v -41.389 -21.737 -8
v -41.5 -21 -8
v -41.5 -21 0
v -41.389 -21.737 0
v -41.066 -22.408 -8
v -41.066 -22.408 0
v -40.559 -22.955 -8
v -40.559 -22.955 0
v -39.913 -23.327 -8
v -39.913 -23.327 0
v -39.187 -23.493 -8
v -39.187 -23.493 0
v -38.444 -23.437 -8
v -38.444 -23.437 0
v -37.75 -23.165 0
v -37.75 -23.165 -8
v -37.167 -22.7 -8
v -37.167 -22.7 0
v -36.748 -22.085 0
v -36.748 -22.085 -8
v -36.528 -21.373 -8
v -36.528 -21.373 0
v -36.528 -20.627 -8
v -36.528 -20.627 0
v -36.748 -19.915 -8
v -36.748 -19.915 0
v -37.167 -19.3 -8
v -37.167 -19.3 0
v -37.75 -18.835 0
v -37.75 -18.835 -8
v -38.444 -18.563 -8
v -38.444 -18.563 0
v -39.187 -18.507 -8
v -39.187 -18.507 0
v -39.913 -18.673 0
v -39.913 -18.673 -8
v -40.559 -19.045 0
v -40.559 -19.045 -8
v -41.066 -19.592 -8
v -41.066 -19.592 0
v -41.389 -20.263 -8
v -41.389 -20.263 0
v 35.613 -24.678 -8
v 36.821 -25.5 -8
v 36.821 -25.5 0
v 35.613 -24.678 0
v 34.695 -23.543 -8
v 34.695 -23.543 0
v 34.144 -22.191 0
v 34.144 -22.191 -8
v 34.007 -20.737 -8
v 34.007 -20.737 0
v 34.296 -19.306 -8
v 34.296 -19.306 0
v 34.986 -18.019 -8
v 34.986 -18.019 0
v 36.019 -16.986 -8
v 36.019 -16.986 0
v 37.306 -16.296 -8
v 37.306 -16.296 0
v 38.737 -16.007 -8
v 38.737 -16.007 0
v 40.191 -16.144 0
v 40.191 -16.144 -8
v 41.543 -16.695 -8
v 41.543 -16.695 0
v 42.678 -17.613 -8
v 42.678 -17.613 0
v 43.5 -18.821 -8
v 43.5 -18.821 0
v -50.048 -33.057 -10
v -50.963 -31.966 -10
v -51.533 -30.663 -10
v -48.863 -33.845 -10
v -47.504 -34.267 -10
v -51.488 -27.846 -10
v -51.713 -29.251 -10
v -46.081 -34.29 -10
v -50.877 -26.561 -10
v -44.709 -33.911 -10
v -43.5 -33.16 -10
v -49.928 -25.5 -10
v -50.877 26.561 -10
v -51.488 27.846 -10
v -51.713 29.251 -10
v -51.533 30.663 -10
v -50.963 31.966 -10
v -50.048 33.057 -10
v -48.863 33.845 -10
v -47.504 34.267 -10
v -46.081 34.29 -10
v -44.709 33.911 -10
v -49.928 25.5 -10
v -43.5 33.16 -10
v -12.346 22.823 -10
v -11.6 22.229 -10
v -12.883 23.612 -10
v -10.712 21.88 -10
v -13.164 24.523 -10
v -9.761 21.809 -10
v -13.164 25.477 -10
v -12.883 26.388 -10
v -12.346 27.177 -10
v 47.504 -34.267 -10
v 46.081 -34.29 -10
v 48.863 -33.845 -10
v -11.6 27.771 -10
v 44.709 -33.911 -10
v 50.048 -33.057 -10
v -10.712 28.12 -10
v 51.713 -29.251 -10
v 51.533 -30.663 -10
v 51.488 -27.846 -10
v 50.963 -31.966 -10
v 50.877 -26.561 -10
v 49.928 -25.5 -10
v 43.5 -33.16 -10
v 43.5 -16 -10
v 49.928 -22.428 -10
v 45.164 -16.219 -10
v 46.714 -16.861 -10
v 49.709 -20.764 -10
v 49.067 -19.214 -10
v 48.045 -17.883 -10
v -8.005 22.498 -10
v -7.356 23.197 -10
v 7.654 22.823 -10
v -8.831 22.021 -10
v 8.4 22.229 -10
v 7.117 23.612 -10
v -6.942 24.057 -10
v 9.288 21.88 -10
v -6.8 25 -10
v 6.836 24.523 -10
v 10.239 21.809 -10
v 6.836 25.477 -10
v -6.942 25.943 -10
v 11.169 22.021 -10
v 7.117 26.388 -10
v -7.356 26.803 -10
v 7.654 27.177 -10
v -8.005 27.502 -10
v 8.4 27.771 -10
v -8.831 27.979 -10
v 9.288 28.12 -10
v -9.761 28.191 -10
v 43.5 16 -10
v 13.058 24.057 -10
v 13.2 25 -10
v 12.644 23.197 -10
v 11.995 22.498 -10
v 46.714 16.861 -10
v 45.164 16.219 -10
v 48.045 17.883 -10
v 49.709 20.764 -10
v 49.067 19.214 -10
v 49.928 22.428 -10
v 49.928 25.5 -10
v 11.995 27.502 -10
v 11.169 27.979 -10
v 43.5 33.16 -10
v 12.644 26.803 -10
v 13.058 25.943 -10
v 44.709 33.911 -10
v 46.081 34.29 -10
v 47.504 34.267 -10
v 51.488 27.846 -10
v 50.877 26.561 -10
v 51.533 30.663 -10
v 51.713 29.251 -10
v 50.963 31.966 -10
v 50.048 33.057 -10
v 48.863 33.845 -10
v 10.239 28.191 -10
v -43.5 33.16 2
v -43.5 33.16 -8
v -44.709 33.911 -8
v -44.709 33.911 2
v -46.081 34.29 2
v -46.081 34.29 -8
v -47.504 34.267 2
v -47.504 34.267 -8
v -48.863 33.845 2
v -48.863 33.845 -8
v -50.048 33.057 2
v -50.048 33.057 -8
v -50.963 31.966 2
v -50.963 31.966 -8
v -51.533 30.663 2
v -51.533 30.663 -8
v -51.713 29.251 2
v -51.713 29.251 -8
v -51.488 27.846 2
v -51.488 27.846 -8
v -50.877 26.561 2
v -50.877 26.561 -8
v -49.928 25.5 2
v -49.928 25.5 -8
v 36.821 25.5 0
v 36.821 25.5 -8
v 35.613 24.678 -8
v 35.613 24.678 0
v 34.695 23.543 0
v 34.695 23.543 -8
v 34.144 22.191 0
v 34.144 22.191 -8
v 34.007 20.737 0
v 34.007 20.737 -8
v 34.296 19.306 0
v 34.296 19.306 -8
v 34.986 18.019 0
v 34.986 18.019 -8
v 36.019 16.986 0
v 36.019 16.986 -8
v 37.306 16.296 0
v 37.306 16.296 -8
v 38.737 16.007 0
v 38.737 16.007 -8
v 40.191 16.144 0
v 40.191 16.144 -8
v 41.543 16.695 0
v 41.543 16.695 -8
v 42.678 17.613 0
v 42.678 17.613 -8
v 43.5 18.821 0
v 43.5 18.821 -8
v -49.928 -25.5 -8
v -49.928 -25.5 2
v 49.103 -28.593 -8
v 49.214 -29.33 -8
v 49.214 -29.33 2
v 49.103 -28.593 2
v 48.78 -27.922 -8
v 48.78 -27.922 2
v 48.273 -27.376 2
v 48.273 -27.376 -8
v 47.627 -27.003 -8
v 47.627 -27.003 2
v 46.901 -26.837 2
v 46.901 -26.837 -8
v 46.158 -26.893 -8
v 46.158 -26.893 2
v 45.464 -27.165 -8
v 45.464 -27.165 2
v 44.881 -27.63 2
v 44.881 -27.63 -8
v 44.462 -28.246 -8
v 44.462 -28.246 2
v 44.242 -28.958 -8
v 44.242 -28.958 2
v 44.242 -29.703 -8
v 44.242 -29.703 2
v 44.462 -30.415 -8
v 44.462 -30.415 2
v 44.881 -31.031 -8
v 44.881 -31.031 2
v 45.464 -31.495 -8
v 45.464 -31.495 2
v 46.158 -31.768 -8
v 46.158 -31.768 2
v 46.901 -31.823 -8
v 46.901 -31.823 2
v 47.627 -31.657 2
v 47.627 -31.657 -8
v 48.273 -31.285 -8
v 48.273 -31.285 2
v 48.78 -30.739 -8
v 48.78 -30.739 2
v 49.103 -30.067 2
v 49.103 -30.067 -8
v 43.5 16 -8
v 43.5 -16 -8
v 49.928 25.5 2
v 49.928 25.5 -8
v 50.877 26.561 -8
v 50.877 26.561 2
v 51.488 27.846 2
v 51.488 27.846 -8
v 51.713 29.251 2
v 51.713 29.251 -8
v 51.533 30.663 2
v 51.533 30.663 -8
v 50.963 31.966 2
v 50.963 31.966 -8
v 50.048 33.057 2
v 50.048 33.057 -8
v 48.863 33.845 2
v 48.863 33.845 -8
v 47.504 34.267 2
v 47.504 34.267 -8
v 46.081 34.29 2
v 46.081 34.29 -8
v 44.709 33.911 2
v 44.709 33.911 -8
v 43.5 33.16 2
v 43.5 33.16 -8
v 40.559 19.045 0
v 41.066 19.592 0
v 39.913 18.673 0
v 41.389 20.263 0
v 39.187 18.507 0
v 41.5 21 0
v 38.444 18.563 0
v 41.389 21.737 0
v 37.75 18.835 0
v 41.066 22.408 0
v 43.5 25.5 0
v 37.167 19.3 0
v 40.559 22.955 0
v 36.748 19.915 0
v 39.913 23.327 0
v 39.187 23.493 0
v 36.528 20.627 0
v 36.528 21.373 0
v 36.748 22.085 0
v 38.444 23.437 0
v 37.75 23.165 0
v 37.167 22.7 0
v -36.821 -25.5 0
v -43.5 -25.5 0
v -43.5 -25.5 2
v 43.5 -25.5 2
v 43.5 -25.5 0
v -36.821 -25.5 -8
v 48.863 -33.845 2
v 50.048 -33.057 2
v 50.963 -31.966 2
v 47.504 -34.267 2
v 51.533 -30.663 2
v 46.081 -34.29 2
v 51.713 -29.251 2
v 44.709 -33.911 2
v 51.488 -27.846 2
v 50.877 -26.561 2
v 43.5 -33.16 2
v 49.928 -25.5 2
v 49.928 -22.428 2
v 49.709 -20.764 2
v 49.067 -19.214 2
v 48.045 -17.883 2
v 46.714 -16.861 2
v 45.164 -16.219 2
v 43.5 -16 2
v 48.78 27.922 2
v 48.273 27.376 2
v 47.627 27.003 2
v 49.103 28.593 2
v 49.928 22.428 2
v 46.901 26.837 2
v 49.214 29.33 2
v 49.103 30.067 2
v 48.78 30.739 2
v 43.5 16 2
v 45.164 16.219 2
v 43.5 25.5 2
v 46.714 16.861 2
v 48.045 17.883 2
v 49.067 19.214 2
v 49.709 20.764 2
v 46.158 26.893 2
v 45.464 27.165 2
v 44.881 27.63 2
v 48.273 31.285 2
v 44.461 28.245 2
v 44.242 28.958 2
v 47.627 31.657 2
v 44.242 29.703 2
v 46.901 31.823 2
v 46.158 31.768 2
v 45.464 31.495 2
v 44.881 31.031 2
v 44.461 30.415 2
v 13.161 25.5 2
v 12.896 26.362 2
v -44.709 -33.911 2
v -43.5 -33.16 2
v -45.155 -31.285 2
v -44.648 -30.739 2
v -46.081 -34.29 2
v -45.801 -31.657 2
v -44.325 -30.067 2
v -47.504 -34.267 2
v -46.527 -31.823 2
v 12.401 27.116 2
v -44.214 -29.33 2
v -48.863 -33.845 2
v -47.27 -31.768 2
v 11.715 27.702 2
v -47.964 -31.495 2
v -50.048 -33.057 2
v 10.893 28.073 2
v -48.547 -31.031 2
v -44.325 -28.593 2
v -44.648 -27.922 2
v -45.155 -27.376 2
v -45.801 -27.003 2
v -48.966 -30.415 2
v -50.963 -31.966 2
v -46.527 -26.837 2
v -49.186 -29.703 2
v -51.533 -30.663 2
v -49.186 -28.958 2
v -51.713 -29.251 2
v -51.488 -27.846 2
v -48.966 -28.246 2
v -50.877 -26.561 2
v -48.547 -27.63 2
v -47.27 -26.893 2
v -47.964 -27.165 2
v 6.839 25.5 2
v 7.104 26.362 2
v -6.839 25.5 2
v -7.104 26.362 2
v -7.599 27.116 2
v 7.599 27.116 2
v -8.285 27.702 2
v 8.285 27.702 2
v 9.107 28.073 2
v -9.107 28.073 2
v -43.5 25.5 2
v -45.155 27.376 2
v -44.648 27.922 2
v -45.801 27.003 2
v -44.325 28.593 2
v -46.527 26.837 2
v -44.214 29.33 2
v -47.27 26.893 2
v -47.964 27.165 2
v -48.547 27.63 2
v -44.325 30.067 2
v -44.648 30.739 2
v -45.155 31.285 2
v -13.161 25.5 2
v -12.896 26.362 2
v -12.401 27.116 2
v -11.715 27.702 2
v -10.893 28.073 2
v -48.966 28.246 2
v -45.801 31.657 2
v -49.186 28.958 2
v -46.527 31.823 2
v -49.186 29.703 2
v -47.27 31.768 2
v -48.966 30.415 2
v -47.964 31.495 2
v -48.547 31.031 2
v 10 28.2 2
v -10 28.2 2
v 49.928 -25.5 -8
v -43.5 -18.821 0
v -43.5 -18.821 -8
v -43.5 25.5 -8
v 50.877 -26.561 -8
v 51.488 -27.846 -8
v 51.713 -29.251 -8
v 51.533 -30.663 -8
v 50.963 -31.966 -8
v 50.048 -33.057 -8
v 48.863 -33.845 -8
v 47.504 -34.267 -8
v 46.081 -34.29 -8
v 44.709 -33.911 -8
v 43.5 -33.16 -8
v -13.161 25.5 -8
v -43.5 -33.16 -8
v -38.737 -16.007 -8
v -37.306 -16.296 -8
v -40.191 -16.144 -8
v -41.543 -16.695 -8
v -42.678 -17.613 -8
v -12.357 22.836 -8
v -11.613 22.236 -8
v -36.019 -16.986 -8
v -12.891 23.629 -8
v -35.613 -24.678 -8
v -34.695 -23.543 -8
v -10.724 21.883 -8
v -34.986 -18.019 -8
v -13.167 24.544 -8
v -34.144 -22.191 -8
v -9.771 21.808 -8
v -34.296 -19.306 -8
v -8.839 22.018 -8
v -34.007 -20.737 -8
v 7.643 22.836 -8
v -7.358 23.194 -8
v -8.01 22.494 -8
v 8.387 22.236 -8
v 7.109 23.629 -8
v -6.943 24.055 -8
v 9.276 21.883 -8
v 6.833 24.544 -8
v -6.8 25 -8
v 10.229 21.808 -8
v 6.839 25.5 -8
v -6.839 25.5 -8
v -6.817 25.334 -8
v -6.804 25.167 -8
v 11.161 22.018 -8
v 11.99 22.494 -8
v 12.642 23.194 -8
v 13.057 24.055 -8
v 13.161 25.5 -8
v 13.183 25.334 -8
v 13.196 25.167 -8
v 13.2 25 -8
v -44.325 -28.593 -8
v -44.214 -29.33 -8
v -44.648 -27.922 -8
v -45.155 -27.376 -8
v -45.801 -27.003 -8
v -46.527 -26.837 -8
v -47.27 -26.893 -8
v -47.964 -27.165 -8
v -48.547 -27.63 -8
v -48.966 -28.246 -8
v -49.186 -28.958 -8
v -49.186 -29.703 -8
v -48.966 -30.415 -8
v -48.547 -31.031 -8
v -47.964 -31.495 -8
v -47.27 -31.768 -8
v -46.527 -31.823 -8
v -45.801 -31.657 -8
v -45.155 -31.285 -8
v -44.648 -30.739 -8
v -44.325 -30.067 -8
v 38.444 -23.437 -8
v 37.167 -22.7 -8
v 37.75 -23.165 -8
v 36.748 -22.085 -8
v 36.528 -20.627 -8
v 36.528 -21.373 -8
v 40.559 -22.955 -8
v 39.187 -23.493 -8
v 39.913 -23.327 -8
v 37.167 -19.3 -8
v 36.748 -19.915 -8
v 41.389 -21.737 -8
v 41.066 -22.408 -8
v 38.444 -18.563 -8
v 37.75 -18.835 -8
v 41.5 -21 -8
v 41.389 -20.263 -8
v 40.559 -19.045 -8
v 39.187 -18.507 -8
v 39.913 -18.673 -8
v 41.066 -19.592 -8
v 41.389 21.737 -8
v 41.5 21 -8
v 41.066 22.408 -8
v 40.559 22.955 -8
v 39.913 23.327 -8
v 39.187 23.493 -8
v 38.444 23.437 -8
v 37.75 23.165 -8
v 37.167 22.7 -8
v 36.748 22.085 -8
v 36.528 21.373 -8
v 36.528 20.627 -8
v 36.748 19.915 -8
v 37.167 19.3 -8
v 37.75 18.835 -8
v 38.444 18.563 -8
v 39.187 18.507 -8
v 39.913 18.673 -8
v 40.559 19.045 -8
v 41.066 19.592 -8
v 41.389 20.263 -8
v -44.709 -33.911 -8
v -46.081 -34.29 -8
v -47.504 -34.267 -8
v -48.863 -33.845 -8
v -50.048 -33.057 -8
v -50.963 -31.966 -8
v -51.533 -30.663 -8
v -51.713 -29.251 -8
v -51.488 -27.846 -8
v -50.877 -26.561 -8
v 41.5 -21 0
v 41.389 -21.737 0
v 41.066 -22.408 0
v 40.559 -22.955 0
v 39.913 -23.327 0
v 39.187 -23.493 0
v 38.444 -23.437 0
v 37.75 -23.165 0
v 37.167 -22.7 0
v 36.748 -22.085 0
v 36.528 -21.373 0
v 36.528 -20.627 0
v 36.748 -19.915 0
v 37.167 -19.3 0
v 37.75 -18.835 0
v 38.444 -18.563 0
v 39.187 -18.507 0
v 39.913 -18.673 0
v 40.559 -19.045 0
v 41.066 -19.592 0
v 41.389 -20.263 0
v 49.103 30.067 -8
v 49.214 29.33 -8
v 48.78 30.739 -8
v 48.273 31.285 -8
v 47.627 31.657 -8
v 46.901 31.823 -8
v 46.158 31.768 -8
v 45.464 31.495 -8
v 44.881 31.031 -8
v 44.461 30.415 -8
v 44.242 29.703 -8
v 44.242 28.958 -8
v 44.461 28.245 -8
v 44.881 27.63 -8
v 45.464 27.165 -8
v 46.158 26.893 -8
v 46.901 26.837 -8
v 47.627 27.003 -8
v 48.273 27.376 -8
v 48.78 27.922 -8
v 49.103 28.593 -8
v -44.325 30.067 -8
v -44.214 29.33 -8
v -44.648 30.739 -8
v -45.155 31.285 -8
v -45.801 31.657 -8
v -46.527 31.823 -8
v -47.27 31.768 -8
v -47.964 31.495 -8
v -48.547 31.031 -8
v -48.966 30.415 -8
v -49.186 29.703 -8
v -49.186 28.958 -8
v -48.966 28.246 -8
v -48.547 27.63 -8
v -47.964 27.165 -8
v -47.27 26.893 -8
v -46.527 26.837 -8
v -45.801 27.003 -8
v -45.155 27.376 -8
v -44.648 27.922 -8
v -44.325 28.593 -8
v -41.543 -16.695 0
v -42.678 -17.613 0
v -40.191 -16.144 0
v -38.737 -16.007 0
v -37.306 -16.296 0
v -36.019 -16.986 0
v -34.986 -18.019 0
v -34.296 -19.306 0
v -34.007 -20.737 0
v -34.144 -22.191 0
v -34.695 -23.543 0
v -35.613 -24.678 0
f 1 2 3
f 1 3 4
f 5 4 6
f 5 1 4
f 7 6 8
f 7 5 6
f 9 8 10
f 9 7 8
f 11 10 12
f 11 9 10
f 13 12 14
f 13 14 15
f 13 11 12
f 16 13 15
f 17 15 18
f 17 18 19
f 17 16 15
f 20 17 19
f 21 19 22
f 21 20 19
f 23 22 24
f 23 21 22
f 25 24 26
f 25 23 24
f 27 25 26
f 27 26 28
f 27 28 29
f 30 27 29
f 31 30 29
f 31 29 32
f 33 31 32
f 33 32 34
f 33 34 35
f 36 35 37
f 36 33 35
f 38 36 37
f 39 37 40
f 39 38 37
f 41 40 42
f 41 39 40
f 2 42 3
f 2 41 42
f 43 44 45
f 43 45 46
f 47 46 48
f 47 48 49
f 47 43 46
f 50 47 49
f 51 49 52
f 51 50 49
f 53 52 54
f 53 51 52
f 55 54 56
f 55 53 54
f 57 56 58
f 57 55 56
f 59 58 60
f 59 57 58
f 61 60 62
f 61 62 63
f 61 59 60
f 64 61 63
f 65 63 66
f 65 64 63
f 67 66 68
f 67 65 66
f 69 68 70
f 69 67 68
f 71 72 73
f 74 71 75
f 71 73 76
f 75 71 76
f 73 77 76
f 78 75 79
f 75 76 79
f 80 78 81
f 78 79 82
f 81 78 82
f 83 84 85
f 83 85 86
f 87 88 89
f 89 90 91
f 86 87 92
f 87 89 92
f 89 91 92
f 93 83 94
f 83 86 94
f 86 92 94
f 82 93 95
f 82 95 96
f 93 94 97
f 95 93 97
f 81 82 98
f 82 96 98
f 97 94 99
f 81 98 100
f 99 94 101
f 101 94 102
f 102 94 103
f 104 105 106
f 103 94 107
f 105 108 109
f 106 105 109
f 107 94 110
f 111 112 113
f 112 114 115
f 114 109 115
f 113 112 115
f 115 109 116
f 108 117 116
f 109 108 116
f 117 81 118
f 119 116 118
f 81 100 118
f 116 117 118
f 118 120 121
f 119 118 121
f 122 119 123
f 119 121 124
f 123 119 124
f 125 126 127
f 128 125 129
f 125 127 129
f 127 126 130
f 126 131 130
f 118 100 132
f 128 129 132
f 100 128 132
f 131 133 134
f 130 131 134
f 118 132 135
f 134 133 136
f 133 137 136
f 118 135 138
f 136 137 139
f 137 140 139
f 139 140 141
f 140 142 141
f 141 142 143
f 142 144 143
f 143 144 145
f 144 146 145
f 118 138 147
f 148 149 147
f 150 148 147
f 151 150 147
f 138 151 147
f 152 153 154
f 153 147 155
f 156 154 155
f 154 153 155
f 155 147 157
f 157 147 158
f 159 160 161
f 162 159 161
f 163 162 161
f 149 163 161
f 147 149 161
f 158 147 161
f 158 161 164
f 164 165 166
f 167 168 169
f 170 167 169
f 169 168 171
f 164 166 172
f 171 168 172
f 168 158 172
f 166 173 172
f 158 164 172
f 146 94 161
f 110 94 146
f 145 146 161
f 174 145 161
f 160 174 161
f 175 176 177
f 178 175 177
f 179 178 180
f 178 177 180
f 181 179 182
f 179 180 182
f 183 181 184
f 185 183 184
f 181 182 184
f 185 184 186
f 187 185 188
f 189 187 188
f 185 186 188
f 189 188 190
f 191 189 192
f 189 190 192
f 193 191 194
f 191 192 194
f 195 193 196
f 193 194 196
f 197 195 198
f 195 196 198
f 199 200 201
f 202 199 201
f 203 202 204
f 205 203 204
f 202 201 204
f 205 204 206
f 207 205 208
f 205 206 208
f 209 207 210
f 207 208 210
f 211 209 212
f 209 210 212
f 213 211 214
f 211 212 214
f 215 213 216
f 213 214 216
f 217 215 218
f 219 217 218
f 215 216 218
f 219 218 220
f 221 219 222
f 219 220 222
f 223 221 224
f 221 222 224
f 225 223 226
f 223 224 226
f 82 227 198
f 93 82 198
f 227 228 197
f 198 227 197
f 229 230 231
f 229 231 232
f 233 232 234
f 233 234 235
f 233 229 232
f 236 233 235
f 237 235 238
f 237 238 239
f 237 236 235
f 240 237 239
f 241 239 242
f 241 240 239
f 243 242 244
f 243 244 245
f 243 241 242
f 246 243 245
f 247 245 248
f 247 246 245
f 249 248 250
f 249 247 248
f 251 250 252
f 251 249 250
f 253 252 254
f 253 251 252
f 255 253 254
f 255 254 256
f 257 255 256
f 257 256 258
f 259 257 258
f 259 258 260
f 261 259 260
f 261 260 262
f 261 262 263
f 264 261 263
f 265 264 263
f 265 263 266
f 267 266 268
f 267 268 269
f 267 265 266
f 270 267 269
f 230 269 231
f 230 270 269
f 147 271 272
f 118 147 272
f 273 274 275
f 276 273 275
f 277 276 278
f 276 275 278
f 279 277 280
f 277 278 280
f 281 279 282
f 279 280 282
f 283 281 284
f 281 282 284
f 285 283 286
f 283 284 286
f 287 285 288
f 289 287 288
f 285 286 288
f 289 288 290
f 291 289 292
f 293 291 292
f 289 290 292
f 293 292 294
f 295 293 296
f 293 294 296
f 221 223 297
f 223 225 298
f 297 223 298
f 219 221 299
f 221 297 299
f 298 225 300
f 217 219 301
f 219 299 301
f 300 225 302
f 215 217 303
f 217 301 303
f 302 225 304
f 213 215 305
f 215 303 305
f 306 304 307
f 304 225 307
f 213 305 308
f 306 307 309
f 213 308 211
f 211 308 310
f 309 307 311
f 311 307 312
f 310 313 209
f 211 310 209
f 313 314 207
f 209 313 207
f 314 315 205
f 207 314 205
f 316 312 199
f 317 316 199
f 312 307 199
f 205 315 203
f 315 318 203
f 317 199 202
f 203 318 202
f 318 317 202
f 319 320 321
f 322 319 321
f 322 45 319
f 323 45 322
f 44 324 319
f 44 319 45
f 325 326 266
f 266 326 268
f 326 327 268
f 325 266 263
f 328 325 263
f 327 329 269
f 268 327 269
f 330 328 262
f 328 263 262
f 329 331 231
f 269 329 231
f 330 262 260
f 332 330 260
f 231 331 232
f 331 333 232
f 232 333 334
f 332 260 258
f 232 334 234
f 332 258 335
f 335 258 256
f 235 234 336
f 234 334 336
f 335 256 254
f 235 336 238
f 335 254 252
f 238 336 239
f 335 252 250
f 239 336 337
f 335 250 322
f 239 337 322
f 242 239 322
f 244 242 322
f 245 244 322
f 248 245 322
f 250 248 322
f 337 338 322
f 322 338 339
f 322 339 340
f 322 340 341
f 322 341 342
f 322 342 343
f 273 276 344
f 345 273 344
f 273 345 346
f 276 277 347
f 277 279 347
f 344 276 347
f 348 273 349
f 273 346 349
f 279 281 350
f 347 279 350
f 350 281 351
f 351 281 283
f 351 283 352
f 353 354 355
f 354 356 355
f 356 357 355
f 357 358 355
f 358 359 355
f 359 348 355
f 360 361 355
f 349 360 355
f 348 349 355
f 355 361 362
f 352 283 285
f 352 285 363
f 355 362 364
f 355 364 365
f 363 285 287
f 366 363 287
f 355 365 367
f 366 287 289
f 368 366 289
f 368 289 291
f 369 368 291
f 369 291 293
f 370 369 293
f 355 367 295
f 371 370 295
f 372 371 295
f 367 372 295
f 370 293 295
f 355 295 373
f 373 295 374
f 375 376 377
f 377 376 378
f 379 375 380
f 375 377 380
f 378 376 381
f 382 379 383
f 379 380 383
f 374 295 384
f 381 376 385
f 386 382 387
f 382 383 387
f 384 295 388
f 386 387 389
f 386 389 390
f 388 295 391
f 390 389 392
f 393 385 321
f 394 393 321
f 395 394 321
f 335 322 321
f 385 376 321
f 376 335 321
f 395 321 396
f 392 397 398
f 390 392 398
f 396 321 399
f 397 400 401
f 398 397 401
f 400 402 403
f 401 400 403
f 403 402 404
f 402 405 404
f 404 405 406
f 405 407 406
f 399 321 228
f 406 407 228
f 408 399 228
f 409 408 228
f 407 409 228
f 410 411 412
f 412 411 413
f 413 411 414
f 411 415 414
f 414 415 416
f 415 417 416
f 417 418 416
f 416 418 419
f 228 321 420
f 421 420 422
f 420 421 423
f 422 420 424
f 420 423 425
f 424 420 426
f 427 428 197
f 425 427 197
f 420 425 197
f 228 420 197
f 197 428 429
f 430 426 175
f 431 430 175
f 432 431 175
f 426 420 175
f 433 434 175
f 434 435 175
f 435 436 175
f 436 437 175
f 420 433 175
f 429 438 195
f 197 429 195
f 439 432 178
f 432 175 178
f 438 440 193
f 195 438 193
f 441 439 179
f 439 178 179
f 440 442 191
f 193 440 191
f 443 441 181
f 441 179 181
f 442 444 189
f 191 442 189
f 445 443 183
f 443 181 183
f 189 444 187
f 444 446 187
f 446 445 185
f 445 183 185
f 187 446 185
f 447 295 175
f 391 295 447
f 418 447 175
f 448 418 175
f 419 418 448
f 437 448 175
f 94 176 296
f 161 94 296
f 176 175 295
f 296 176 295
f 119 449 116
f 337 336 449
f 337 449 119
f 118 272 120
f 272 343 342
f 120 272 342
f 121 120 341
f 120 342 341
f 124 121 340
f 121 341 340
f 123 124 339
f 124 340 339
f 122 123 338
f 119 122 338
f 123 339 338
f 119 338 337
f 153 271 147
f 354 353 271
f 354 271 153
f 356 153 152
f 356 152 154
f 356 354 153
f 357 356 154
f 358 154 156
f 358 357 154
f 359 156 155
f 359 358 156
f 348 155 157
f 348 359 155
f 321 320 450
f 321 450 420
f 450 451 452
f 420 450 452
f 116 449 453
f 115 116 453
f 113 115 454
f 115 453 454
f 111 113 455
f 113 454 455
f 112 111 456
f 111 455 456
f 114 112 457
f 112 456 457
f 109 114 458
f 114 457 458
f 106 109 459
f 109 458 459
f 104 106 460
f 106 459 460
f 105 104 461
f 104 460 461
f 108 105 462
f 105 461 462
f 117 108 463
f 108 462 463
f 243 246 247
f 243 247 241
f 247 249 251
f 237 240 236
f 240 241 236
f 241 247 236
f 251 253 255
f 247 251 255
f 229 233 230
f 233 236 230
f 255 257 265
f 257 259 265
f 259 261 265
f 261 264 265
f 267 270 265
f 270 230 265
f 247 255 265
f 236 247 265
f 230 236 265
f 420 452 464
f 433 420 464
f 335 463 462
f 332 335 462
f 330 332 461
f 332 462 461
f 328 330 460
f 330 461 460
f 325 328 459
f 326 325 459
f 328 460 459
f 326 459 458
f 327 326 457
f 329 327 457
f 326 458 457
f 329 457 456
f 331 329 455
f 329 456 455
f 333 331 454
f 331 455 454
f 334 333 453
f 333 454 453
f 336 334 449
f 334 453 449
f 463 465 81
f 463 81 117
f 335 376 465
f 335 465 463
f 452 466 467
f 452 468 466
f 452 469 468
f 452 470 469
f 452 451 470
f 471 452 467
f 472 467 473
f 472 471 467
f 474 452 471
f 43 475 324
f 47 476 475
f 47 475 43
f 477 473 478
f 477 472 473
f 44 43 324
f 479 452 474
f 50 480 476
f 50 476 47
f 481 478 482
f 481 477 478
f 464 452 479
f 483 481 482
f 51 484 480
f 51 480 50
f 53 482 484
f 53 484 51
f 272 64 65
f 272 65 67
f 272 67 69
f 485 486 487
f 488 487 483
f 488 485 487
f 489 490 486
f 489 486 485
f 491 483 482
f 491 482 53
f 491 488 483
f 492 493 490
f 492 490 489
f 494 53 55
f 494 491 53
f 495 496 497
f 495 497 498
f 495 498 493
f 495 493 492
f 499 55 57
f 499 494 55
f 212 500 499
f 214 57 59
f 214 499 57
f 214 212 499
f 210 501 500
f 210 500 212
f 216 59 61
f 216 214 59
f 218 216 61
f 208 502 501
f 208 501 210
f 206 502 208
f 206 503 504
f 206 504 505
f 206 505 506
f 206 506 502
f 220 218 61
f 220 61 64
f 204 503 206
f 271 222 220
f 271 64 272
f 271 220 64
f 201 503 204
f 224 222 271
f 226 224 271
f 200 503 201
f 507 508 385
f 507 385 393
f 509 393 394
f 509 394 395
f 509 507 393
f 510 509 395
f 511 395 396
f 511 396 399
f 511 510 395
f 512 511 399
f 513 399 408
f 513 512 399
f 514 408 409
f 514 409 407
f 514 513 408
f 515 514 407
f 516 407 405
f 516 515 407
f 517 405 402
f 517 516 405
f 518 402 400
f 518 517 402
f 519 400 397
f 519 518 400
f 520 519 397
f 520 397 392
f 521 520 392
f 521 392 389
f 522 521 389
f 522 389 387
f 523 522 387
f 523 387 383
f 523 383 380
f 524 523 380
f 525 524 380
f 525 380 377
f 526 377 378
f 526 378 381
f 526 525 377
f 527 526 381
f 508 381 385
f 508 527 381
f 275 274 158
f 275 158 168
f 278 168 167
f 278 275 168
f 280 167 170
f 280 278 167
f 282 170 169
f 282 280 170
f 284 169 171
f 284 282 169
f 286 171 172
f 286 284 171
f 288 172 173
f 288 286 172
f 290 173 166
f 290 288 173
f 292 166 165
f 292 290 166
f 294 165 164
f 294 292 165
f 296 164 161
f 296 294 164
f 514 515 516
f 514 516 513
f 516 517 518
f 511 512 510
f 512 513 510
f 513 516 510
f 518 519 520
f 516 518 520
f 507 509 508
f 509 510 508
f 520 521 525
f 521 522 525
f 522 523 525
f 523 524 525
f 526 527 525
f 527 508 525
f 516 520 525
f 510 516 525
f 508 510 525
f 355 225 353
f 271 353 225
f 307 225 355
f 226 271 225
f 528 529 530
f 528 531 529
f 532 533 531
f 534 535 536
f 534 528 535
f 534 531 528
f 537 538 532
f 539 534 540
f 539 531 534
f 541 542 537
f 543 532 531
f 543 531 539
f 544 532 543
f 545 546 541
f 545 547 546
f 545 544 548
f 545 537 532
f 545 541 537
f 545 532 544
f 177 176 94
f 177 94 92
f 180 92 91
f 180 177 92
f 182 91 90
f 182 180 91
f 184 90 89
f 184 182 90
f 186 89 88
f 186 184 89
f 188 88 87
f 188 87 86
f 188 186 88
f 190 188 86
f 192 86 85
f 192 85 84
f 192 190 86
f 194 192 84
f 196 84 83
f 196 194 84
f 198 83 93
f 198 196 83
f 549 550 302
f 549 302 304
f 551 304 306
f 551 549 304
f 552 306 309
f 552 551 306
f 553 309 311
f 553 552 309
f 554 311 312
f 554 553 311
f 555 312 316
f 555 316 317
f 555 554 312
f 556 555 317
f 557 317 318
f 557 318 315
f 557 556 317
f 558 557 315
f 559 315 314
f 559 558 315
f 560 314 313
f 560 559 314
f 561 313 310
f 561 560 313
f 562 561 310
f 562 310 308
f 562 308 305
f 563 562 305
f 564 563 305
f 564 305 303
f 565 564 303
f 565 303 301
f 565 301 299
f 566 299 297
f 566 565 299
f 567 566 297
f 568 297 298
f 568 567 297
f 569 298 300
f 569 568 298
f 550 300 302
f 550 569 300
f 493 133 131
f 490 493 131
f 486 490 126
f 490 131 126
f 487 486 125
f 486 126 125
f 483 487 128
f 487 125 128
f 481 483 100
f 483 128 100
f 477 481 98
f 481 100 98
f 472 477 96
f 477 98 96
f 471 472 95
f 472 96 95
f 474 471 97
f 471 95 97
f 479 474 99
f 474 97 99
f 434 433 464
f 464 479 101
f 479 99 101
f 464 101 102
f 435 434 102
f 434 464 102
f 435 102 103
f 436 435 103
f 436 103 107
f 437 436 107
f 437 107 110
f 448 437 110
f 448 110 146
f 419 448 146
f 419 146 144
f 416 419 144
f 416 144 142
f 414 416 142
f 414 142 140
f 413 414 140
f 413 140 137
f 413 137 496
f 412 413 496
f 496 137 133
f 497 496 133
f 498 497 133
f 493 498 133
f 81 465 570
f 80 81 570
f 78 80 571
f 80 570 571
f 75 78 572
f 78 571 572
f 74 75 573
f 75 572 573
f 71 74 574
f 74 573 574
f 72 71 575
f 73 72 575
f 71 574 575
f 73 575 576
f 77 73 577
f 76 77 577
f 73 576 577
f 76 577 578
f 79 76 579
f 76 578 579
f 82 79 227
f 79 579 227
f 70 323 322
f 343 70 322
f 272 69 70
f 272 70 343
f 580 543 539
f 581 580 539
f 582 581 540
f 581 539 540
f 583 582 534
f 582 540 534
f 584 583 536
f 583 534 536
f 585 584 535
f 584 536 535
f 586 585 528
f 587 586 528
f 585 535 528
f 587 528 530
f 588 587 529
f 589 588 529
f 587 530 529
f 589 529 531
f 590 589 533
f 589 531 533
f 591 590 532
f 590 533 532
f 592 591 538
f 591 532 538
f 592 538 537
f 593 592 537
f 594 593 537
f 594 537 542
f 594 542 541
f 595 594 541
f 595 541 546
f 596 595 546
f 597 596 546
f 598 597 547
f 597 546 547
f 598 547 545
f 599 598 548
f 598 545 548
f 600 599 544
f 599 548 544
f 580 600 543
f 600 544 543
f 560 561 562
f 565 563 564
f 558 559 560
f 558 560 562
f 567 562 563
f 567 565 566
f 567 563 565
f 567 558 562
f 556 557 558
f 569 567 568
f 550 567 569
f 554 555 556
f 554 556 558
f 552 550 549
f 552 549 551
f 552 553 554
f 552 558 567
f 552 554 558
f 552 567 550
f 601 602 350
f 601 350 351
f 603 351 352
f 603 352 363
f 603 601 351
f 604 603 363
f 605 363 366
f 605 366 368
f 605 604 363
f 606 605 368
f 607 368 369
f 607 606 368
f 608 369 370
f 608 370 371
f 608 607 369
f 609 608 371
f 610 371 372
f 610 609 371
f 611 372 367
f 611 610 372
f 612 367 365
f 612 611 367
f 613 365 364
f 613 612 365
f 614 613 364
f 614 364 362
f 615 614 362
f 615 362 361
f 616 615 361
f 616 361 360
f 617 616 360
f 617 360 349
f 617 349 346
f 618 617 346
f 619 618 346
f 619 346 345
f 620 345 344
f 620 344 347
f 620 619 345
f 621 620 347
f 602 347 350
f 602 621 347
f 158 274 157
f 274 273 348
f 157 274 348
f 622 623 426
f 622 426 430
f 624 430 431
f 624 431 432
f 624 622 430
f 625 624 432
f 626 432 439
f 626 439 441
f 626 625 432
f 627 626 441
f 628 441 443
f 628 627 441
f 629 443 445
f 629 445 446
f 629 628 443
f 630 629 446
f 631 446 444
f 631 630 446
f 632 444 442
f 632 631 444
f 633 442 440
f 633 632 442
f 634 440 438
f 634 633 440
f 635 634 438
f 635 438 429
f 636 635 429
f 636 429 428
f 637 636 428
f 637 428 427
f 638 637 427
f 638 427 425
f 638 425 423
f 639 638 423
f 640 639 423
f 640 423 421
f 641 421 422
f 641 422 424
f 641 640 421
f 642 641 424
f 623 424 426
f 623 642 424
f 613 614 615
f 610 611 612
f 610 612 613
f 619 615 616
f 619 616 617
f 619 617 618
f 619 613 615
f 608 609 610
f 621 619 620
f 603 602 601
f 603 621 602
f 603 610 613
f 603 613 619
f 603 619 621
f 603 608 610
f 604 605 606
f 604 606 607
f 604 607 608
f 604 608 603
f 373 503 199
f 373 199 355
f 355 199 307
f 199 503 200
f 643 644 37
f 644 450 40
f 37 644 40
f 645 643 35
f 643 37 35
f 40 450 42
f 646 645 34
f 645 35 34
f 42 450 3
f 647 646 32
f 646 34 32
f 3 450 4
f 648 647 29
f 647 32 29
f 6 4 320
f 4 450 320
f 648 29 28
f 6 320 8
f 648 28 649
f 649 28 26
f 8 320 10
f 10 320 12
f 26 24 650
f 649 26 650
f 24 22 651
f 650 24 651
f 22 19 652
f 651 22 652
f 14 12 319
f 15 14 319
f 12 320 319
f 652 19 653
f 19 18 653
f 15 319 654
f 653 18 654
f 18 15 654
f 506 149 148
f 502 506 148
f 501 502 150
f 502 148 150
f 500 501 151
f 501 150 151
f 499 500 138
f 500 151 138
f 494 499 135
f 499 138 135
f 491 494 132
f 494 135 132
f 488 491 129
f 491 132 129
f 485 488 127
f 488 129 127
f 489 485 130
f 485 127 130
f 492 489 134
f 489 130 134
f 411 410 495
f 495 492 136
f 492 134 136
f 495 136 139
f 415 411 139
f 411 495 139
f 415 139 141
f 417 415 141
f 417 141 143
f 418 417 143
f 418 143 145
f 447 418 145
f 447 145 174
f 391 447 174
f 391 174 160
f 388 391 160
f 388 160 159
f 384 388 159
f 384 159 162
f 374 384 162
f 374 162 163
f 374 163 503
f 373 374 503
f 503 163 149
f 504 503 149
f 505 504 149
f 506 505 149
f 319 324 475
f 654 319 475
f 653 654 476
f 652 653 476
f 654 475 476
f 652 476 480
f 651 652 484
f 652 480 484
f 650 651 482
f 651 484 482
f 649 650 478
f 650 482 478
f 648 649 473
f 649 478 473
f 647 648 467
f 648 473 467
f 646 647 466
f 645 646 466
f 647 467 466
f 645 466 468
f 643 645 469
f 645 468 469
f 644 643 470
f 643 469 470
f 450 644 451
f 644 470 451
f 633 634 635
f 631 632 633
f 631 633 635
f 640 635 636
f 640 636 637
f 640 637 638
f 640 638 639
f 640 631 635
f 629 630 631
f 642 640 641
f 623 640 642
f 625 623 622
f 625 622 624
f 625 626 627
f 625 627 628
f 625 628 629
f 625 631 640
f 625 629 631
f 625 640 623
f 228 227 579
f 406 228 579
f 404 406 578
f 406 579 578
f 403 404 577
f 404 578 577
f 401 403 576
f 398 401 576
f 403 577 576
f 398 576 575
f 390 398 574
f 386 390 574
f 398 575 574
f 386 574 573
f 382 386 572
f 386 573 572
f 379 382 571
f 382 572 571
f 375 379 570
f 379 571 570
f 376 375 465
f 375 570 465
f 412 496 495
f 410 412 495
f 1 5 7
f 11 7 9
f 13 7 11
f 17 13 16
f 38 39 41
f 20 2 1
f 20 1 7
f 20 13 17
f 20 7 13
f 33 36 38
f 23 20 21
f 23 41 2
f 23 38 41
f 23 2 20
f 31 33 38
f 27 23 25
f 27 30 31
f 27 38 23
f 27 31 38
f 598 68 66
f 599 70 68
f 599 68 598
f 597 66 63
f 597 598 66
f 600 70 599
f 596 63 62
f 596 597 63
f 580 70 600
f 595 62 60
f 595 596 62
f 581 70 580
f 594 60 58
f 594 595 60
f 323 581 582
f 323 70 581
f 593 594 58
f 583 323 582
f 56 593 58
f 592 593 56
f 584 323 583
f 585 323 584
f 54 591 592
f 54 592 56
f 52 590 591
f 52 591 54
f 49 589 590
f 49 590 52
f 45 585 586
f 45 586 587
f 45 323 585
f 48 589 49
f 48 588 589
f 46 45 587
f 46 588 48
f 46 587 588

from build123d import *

# Parameters (mm, degrees)
SKETCH_R                   = 2.5
SKETCH_W                   = 87
SKETCH_H                   = 51
PAD_DEPTH                  = 10
POCKET_DEPTH               = 10.001
PAD001_DEPTH               = 2
SKETCH003_R                = 2.5
PAD002_DEPTH               = 8
SKETCH003_MIRRORED001_2_R  = 2.5
PAD002_MIRRORED001_2_DEPTH = 8
SKETCH004_R                = 3.2
POCKET001_DEPTH            = 12.001
POCKET004_DEPTH            = 8


with BuildPart() as part:
    # Sketch → Pad (new body)
    with BuildSketch(Plane.XY):
        with BuildLine():
            Line((-43.499999, 33.160444), (43.499999, 33.160444))
            ThreePointArc((49.927876, 25.500001), (50.544139, 32.544145), (43.499999, 33.160444))
            Line((49.927876, 25.500001), (49.927876, -25.500001))
            ThreePointArc((43.499999, -33.160444), (50.544159, -32.544162), (49.927876, -25.500001))
            Line((43.499999, -33.160444), (-43.499999, -33.160444))
            ThreePointArc((-49.927876, -25.500001), (-50.544159, -32.544162), (-43.499999, -33.160444))
            Line((-49.927876, -25.500001), (-49.927876, 25.500001))
            ThreePointArc((-43.499999, 33.160444), (-50.544159, 32.544162), (-49.927876, 25.500001))
        make_face()
        with Locations((-46.713937, 29.330223)):
            Circle(SKETCH_R, mode=Mode.SUBTRACT)
        with Locations((46.713917, 29.330206)):
            Circle(SKETCH_R, mode=Mode.SUBTRACT)
        with Locations((46.713937, -29.330223)):
            Circle(SKETCH_R, mode=Mode.SUBTRACT)
        with Locations((-46.713937, -29.330223)):
            Circle(SKETCH_R, mode=Mode.SUBTRACT)
        Rectangle(SKETCH_W, SKETCH_H, mode=Mode.SUBTRACT)
    extrude(amount=PAD_DEPTH)

    # Sketch001 (on Face18 of Pad) → Pocket (cut, through all)
    with BuildSketch(Plane.XY.offset(10)):
        with BuildLine():
            ThreePointArc((43.5, 16), (48.045195, 17.882681), (49.927876, 22.427876))
            Line((49.927876, 22.427876), (49.927876, -22.427876))
            ThreePointArc((49.927876, -22.427876), (48.045195, -17.882681), (43.5, -16))
            Line((43.5, 16), (43.5, -16))
        make_face()
    extrude(amount=-POCKET_DEPTH, mode=Mode.SUBTRACT)

    # Sketch002 (on Face4 of Pocket) → Pad001 (join)
    with BuildSketch(Plane(origin=(0, 0, 0), x_dir=(1, 0, 0), z_dir=(0, 0, -1))):
        with BuildLine():
            ThreePointArc((-43.499999, 33.160444), (-50.544168, 32.544169), (-49.927876, 25.500001))
            Line((-49.927876, 0), (-49.927876, 25.500001))
            Line((43.5, 0), (-49.927876, 0))
            Line((43.5, 16), (43.5, 0))
            ThreePointArc((43.5, 16), (48.045195, 17.882681), (49.927876, 22.427876))
            Line((49.927876, 25.500001), (49.927876, 22.427876))
            ThreePointArc((49.927876, 25.500001), (50.544166, 32.544167), (43.499999, 33.160444))
            Line((-43.499999, 33.160444), (43.499999, 33.160444))
        make_face()
    pad001 = extrude(amount=PAD001_DEPTH)

    # Mirrored: Pad001 across XZ
    add(pad001.mirror(Plane.XZ))

    # Sketch003 (on Face31 of Mirrored) → Pad002 (join)
    with BuildSketch(Plane.XY):
        with BuildLine():
            Line((36.820551, 25.5), (43.5, 25.5))
            Line((43.5, 25.5), (43.5, 18.820551))
            ThreePointArc((36.820551, 25.5), (35.464466, 17.464466), (43.5, 18.820551))
        make_face()
        with Locations((39, 21)):
            Circle(SKETCH003_R, mode=Mode.SUBTRACT)
    pad002 = extrude(amount=PAD002_DEPTH)

    # Sketch003 Mirrored001 2 → Pad002 Mirrored001 2 (add)
    with BuildSketch(Plane(origin=(0, 0, 0), x_dir=(-1, 0, 0), z_dir=(0, 0, -1))):
        with BuildLine():
            Line((36.820551, 25.5), (43.5, 25.5))
            Line((43.5, 25.5), (43.5, 18.820551))
            ThreePointArc((36.820551, 25.5), (35.464466, 17.464466), (43.5, 18.820551))
        make_face()
        with Locations((39, 21)):
            Circle(SKETCH003_MIRRORED001_2_R, mode=Mode.SUBTRACT)
    pad002_mirrored001_2 = extrude(amount=-PAD002_MIRRORED001_2_DEPTH)

    # Mirrored002: Pad002, Pad002 Mirrored001 2 across Sketch003 H_Axis
    add(pad002.mirror(Plane.ZX))
    add(pad002_mirrored001_2.mirror(Plane.ZX))

    # Sketch004 (on Face8 of MultiTransform) → Pocket001 (cut, through all)
    with BuildSketch(Plane(origin=(0, 0, -2), x_dir=(1, 0, 0), z_dir=(0, 0, -1))):
        with Locations((-10, -25)):
            Circle(SKETCH004_R)
        with Locations((10, -25)):
            Circle(SKETCH004_R)
    extrude(amount=-POCKET001_DEPTH, mode=Mode.SUBTRACT)

    # Sketch011 (on Face36 of Pocket001) → Pocket004 (cut)
    with BuildSketch(Plane.XY.offset(8)):
        with BuildLine():
            Line((-36.820551, 25.5), (-43.5, 25.5))
            Line((-43.5, 25.5), (-43.5, 18.820551))
            ThreePointArc((-43.5, 18.820551), (-35.464466, 17.464466), (-36.820551, 25.5))
        make_face()
    extrude(amount=-POCKET004_DEPTH, mode=Mode.SUBTRACT)


with BuildPart() as part_1:
    # Body placement: moved
    add(part.part.moved(Location((0, 0, -8))))


solid = part_1.part
